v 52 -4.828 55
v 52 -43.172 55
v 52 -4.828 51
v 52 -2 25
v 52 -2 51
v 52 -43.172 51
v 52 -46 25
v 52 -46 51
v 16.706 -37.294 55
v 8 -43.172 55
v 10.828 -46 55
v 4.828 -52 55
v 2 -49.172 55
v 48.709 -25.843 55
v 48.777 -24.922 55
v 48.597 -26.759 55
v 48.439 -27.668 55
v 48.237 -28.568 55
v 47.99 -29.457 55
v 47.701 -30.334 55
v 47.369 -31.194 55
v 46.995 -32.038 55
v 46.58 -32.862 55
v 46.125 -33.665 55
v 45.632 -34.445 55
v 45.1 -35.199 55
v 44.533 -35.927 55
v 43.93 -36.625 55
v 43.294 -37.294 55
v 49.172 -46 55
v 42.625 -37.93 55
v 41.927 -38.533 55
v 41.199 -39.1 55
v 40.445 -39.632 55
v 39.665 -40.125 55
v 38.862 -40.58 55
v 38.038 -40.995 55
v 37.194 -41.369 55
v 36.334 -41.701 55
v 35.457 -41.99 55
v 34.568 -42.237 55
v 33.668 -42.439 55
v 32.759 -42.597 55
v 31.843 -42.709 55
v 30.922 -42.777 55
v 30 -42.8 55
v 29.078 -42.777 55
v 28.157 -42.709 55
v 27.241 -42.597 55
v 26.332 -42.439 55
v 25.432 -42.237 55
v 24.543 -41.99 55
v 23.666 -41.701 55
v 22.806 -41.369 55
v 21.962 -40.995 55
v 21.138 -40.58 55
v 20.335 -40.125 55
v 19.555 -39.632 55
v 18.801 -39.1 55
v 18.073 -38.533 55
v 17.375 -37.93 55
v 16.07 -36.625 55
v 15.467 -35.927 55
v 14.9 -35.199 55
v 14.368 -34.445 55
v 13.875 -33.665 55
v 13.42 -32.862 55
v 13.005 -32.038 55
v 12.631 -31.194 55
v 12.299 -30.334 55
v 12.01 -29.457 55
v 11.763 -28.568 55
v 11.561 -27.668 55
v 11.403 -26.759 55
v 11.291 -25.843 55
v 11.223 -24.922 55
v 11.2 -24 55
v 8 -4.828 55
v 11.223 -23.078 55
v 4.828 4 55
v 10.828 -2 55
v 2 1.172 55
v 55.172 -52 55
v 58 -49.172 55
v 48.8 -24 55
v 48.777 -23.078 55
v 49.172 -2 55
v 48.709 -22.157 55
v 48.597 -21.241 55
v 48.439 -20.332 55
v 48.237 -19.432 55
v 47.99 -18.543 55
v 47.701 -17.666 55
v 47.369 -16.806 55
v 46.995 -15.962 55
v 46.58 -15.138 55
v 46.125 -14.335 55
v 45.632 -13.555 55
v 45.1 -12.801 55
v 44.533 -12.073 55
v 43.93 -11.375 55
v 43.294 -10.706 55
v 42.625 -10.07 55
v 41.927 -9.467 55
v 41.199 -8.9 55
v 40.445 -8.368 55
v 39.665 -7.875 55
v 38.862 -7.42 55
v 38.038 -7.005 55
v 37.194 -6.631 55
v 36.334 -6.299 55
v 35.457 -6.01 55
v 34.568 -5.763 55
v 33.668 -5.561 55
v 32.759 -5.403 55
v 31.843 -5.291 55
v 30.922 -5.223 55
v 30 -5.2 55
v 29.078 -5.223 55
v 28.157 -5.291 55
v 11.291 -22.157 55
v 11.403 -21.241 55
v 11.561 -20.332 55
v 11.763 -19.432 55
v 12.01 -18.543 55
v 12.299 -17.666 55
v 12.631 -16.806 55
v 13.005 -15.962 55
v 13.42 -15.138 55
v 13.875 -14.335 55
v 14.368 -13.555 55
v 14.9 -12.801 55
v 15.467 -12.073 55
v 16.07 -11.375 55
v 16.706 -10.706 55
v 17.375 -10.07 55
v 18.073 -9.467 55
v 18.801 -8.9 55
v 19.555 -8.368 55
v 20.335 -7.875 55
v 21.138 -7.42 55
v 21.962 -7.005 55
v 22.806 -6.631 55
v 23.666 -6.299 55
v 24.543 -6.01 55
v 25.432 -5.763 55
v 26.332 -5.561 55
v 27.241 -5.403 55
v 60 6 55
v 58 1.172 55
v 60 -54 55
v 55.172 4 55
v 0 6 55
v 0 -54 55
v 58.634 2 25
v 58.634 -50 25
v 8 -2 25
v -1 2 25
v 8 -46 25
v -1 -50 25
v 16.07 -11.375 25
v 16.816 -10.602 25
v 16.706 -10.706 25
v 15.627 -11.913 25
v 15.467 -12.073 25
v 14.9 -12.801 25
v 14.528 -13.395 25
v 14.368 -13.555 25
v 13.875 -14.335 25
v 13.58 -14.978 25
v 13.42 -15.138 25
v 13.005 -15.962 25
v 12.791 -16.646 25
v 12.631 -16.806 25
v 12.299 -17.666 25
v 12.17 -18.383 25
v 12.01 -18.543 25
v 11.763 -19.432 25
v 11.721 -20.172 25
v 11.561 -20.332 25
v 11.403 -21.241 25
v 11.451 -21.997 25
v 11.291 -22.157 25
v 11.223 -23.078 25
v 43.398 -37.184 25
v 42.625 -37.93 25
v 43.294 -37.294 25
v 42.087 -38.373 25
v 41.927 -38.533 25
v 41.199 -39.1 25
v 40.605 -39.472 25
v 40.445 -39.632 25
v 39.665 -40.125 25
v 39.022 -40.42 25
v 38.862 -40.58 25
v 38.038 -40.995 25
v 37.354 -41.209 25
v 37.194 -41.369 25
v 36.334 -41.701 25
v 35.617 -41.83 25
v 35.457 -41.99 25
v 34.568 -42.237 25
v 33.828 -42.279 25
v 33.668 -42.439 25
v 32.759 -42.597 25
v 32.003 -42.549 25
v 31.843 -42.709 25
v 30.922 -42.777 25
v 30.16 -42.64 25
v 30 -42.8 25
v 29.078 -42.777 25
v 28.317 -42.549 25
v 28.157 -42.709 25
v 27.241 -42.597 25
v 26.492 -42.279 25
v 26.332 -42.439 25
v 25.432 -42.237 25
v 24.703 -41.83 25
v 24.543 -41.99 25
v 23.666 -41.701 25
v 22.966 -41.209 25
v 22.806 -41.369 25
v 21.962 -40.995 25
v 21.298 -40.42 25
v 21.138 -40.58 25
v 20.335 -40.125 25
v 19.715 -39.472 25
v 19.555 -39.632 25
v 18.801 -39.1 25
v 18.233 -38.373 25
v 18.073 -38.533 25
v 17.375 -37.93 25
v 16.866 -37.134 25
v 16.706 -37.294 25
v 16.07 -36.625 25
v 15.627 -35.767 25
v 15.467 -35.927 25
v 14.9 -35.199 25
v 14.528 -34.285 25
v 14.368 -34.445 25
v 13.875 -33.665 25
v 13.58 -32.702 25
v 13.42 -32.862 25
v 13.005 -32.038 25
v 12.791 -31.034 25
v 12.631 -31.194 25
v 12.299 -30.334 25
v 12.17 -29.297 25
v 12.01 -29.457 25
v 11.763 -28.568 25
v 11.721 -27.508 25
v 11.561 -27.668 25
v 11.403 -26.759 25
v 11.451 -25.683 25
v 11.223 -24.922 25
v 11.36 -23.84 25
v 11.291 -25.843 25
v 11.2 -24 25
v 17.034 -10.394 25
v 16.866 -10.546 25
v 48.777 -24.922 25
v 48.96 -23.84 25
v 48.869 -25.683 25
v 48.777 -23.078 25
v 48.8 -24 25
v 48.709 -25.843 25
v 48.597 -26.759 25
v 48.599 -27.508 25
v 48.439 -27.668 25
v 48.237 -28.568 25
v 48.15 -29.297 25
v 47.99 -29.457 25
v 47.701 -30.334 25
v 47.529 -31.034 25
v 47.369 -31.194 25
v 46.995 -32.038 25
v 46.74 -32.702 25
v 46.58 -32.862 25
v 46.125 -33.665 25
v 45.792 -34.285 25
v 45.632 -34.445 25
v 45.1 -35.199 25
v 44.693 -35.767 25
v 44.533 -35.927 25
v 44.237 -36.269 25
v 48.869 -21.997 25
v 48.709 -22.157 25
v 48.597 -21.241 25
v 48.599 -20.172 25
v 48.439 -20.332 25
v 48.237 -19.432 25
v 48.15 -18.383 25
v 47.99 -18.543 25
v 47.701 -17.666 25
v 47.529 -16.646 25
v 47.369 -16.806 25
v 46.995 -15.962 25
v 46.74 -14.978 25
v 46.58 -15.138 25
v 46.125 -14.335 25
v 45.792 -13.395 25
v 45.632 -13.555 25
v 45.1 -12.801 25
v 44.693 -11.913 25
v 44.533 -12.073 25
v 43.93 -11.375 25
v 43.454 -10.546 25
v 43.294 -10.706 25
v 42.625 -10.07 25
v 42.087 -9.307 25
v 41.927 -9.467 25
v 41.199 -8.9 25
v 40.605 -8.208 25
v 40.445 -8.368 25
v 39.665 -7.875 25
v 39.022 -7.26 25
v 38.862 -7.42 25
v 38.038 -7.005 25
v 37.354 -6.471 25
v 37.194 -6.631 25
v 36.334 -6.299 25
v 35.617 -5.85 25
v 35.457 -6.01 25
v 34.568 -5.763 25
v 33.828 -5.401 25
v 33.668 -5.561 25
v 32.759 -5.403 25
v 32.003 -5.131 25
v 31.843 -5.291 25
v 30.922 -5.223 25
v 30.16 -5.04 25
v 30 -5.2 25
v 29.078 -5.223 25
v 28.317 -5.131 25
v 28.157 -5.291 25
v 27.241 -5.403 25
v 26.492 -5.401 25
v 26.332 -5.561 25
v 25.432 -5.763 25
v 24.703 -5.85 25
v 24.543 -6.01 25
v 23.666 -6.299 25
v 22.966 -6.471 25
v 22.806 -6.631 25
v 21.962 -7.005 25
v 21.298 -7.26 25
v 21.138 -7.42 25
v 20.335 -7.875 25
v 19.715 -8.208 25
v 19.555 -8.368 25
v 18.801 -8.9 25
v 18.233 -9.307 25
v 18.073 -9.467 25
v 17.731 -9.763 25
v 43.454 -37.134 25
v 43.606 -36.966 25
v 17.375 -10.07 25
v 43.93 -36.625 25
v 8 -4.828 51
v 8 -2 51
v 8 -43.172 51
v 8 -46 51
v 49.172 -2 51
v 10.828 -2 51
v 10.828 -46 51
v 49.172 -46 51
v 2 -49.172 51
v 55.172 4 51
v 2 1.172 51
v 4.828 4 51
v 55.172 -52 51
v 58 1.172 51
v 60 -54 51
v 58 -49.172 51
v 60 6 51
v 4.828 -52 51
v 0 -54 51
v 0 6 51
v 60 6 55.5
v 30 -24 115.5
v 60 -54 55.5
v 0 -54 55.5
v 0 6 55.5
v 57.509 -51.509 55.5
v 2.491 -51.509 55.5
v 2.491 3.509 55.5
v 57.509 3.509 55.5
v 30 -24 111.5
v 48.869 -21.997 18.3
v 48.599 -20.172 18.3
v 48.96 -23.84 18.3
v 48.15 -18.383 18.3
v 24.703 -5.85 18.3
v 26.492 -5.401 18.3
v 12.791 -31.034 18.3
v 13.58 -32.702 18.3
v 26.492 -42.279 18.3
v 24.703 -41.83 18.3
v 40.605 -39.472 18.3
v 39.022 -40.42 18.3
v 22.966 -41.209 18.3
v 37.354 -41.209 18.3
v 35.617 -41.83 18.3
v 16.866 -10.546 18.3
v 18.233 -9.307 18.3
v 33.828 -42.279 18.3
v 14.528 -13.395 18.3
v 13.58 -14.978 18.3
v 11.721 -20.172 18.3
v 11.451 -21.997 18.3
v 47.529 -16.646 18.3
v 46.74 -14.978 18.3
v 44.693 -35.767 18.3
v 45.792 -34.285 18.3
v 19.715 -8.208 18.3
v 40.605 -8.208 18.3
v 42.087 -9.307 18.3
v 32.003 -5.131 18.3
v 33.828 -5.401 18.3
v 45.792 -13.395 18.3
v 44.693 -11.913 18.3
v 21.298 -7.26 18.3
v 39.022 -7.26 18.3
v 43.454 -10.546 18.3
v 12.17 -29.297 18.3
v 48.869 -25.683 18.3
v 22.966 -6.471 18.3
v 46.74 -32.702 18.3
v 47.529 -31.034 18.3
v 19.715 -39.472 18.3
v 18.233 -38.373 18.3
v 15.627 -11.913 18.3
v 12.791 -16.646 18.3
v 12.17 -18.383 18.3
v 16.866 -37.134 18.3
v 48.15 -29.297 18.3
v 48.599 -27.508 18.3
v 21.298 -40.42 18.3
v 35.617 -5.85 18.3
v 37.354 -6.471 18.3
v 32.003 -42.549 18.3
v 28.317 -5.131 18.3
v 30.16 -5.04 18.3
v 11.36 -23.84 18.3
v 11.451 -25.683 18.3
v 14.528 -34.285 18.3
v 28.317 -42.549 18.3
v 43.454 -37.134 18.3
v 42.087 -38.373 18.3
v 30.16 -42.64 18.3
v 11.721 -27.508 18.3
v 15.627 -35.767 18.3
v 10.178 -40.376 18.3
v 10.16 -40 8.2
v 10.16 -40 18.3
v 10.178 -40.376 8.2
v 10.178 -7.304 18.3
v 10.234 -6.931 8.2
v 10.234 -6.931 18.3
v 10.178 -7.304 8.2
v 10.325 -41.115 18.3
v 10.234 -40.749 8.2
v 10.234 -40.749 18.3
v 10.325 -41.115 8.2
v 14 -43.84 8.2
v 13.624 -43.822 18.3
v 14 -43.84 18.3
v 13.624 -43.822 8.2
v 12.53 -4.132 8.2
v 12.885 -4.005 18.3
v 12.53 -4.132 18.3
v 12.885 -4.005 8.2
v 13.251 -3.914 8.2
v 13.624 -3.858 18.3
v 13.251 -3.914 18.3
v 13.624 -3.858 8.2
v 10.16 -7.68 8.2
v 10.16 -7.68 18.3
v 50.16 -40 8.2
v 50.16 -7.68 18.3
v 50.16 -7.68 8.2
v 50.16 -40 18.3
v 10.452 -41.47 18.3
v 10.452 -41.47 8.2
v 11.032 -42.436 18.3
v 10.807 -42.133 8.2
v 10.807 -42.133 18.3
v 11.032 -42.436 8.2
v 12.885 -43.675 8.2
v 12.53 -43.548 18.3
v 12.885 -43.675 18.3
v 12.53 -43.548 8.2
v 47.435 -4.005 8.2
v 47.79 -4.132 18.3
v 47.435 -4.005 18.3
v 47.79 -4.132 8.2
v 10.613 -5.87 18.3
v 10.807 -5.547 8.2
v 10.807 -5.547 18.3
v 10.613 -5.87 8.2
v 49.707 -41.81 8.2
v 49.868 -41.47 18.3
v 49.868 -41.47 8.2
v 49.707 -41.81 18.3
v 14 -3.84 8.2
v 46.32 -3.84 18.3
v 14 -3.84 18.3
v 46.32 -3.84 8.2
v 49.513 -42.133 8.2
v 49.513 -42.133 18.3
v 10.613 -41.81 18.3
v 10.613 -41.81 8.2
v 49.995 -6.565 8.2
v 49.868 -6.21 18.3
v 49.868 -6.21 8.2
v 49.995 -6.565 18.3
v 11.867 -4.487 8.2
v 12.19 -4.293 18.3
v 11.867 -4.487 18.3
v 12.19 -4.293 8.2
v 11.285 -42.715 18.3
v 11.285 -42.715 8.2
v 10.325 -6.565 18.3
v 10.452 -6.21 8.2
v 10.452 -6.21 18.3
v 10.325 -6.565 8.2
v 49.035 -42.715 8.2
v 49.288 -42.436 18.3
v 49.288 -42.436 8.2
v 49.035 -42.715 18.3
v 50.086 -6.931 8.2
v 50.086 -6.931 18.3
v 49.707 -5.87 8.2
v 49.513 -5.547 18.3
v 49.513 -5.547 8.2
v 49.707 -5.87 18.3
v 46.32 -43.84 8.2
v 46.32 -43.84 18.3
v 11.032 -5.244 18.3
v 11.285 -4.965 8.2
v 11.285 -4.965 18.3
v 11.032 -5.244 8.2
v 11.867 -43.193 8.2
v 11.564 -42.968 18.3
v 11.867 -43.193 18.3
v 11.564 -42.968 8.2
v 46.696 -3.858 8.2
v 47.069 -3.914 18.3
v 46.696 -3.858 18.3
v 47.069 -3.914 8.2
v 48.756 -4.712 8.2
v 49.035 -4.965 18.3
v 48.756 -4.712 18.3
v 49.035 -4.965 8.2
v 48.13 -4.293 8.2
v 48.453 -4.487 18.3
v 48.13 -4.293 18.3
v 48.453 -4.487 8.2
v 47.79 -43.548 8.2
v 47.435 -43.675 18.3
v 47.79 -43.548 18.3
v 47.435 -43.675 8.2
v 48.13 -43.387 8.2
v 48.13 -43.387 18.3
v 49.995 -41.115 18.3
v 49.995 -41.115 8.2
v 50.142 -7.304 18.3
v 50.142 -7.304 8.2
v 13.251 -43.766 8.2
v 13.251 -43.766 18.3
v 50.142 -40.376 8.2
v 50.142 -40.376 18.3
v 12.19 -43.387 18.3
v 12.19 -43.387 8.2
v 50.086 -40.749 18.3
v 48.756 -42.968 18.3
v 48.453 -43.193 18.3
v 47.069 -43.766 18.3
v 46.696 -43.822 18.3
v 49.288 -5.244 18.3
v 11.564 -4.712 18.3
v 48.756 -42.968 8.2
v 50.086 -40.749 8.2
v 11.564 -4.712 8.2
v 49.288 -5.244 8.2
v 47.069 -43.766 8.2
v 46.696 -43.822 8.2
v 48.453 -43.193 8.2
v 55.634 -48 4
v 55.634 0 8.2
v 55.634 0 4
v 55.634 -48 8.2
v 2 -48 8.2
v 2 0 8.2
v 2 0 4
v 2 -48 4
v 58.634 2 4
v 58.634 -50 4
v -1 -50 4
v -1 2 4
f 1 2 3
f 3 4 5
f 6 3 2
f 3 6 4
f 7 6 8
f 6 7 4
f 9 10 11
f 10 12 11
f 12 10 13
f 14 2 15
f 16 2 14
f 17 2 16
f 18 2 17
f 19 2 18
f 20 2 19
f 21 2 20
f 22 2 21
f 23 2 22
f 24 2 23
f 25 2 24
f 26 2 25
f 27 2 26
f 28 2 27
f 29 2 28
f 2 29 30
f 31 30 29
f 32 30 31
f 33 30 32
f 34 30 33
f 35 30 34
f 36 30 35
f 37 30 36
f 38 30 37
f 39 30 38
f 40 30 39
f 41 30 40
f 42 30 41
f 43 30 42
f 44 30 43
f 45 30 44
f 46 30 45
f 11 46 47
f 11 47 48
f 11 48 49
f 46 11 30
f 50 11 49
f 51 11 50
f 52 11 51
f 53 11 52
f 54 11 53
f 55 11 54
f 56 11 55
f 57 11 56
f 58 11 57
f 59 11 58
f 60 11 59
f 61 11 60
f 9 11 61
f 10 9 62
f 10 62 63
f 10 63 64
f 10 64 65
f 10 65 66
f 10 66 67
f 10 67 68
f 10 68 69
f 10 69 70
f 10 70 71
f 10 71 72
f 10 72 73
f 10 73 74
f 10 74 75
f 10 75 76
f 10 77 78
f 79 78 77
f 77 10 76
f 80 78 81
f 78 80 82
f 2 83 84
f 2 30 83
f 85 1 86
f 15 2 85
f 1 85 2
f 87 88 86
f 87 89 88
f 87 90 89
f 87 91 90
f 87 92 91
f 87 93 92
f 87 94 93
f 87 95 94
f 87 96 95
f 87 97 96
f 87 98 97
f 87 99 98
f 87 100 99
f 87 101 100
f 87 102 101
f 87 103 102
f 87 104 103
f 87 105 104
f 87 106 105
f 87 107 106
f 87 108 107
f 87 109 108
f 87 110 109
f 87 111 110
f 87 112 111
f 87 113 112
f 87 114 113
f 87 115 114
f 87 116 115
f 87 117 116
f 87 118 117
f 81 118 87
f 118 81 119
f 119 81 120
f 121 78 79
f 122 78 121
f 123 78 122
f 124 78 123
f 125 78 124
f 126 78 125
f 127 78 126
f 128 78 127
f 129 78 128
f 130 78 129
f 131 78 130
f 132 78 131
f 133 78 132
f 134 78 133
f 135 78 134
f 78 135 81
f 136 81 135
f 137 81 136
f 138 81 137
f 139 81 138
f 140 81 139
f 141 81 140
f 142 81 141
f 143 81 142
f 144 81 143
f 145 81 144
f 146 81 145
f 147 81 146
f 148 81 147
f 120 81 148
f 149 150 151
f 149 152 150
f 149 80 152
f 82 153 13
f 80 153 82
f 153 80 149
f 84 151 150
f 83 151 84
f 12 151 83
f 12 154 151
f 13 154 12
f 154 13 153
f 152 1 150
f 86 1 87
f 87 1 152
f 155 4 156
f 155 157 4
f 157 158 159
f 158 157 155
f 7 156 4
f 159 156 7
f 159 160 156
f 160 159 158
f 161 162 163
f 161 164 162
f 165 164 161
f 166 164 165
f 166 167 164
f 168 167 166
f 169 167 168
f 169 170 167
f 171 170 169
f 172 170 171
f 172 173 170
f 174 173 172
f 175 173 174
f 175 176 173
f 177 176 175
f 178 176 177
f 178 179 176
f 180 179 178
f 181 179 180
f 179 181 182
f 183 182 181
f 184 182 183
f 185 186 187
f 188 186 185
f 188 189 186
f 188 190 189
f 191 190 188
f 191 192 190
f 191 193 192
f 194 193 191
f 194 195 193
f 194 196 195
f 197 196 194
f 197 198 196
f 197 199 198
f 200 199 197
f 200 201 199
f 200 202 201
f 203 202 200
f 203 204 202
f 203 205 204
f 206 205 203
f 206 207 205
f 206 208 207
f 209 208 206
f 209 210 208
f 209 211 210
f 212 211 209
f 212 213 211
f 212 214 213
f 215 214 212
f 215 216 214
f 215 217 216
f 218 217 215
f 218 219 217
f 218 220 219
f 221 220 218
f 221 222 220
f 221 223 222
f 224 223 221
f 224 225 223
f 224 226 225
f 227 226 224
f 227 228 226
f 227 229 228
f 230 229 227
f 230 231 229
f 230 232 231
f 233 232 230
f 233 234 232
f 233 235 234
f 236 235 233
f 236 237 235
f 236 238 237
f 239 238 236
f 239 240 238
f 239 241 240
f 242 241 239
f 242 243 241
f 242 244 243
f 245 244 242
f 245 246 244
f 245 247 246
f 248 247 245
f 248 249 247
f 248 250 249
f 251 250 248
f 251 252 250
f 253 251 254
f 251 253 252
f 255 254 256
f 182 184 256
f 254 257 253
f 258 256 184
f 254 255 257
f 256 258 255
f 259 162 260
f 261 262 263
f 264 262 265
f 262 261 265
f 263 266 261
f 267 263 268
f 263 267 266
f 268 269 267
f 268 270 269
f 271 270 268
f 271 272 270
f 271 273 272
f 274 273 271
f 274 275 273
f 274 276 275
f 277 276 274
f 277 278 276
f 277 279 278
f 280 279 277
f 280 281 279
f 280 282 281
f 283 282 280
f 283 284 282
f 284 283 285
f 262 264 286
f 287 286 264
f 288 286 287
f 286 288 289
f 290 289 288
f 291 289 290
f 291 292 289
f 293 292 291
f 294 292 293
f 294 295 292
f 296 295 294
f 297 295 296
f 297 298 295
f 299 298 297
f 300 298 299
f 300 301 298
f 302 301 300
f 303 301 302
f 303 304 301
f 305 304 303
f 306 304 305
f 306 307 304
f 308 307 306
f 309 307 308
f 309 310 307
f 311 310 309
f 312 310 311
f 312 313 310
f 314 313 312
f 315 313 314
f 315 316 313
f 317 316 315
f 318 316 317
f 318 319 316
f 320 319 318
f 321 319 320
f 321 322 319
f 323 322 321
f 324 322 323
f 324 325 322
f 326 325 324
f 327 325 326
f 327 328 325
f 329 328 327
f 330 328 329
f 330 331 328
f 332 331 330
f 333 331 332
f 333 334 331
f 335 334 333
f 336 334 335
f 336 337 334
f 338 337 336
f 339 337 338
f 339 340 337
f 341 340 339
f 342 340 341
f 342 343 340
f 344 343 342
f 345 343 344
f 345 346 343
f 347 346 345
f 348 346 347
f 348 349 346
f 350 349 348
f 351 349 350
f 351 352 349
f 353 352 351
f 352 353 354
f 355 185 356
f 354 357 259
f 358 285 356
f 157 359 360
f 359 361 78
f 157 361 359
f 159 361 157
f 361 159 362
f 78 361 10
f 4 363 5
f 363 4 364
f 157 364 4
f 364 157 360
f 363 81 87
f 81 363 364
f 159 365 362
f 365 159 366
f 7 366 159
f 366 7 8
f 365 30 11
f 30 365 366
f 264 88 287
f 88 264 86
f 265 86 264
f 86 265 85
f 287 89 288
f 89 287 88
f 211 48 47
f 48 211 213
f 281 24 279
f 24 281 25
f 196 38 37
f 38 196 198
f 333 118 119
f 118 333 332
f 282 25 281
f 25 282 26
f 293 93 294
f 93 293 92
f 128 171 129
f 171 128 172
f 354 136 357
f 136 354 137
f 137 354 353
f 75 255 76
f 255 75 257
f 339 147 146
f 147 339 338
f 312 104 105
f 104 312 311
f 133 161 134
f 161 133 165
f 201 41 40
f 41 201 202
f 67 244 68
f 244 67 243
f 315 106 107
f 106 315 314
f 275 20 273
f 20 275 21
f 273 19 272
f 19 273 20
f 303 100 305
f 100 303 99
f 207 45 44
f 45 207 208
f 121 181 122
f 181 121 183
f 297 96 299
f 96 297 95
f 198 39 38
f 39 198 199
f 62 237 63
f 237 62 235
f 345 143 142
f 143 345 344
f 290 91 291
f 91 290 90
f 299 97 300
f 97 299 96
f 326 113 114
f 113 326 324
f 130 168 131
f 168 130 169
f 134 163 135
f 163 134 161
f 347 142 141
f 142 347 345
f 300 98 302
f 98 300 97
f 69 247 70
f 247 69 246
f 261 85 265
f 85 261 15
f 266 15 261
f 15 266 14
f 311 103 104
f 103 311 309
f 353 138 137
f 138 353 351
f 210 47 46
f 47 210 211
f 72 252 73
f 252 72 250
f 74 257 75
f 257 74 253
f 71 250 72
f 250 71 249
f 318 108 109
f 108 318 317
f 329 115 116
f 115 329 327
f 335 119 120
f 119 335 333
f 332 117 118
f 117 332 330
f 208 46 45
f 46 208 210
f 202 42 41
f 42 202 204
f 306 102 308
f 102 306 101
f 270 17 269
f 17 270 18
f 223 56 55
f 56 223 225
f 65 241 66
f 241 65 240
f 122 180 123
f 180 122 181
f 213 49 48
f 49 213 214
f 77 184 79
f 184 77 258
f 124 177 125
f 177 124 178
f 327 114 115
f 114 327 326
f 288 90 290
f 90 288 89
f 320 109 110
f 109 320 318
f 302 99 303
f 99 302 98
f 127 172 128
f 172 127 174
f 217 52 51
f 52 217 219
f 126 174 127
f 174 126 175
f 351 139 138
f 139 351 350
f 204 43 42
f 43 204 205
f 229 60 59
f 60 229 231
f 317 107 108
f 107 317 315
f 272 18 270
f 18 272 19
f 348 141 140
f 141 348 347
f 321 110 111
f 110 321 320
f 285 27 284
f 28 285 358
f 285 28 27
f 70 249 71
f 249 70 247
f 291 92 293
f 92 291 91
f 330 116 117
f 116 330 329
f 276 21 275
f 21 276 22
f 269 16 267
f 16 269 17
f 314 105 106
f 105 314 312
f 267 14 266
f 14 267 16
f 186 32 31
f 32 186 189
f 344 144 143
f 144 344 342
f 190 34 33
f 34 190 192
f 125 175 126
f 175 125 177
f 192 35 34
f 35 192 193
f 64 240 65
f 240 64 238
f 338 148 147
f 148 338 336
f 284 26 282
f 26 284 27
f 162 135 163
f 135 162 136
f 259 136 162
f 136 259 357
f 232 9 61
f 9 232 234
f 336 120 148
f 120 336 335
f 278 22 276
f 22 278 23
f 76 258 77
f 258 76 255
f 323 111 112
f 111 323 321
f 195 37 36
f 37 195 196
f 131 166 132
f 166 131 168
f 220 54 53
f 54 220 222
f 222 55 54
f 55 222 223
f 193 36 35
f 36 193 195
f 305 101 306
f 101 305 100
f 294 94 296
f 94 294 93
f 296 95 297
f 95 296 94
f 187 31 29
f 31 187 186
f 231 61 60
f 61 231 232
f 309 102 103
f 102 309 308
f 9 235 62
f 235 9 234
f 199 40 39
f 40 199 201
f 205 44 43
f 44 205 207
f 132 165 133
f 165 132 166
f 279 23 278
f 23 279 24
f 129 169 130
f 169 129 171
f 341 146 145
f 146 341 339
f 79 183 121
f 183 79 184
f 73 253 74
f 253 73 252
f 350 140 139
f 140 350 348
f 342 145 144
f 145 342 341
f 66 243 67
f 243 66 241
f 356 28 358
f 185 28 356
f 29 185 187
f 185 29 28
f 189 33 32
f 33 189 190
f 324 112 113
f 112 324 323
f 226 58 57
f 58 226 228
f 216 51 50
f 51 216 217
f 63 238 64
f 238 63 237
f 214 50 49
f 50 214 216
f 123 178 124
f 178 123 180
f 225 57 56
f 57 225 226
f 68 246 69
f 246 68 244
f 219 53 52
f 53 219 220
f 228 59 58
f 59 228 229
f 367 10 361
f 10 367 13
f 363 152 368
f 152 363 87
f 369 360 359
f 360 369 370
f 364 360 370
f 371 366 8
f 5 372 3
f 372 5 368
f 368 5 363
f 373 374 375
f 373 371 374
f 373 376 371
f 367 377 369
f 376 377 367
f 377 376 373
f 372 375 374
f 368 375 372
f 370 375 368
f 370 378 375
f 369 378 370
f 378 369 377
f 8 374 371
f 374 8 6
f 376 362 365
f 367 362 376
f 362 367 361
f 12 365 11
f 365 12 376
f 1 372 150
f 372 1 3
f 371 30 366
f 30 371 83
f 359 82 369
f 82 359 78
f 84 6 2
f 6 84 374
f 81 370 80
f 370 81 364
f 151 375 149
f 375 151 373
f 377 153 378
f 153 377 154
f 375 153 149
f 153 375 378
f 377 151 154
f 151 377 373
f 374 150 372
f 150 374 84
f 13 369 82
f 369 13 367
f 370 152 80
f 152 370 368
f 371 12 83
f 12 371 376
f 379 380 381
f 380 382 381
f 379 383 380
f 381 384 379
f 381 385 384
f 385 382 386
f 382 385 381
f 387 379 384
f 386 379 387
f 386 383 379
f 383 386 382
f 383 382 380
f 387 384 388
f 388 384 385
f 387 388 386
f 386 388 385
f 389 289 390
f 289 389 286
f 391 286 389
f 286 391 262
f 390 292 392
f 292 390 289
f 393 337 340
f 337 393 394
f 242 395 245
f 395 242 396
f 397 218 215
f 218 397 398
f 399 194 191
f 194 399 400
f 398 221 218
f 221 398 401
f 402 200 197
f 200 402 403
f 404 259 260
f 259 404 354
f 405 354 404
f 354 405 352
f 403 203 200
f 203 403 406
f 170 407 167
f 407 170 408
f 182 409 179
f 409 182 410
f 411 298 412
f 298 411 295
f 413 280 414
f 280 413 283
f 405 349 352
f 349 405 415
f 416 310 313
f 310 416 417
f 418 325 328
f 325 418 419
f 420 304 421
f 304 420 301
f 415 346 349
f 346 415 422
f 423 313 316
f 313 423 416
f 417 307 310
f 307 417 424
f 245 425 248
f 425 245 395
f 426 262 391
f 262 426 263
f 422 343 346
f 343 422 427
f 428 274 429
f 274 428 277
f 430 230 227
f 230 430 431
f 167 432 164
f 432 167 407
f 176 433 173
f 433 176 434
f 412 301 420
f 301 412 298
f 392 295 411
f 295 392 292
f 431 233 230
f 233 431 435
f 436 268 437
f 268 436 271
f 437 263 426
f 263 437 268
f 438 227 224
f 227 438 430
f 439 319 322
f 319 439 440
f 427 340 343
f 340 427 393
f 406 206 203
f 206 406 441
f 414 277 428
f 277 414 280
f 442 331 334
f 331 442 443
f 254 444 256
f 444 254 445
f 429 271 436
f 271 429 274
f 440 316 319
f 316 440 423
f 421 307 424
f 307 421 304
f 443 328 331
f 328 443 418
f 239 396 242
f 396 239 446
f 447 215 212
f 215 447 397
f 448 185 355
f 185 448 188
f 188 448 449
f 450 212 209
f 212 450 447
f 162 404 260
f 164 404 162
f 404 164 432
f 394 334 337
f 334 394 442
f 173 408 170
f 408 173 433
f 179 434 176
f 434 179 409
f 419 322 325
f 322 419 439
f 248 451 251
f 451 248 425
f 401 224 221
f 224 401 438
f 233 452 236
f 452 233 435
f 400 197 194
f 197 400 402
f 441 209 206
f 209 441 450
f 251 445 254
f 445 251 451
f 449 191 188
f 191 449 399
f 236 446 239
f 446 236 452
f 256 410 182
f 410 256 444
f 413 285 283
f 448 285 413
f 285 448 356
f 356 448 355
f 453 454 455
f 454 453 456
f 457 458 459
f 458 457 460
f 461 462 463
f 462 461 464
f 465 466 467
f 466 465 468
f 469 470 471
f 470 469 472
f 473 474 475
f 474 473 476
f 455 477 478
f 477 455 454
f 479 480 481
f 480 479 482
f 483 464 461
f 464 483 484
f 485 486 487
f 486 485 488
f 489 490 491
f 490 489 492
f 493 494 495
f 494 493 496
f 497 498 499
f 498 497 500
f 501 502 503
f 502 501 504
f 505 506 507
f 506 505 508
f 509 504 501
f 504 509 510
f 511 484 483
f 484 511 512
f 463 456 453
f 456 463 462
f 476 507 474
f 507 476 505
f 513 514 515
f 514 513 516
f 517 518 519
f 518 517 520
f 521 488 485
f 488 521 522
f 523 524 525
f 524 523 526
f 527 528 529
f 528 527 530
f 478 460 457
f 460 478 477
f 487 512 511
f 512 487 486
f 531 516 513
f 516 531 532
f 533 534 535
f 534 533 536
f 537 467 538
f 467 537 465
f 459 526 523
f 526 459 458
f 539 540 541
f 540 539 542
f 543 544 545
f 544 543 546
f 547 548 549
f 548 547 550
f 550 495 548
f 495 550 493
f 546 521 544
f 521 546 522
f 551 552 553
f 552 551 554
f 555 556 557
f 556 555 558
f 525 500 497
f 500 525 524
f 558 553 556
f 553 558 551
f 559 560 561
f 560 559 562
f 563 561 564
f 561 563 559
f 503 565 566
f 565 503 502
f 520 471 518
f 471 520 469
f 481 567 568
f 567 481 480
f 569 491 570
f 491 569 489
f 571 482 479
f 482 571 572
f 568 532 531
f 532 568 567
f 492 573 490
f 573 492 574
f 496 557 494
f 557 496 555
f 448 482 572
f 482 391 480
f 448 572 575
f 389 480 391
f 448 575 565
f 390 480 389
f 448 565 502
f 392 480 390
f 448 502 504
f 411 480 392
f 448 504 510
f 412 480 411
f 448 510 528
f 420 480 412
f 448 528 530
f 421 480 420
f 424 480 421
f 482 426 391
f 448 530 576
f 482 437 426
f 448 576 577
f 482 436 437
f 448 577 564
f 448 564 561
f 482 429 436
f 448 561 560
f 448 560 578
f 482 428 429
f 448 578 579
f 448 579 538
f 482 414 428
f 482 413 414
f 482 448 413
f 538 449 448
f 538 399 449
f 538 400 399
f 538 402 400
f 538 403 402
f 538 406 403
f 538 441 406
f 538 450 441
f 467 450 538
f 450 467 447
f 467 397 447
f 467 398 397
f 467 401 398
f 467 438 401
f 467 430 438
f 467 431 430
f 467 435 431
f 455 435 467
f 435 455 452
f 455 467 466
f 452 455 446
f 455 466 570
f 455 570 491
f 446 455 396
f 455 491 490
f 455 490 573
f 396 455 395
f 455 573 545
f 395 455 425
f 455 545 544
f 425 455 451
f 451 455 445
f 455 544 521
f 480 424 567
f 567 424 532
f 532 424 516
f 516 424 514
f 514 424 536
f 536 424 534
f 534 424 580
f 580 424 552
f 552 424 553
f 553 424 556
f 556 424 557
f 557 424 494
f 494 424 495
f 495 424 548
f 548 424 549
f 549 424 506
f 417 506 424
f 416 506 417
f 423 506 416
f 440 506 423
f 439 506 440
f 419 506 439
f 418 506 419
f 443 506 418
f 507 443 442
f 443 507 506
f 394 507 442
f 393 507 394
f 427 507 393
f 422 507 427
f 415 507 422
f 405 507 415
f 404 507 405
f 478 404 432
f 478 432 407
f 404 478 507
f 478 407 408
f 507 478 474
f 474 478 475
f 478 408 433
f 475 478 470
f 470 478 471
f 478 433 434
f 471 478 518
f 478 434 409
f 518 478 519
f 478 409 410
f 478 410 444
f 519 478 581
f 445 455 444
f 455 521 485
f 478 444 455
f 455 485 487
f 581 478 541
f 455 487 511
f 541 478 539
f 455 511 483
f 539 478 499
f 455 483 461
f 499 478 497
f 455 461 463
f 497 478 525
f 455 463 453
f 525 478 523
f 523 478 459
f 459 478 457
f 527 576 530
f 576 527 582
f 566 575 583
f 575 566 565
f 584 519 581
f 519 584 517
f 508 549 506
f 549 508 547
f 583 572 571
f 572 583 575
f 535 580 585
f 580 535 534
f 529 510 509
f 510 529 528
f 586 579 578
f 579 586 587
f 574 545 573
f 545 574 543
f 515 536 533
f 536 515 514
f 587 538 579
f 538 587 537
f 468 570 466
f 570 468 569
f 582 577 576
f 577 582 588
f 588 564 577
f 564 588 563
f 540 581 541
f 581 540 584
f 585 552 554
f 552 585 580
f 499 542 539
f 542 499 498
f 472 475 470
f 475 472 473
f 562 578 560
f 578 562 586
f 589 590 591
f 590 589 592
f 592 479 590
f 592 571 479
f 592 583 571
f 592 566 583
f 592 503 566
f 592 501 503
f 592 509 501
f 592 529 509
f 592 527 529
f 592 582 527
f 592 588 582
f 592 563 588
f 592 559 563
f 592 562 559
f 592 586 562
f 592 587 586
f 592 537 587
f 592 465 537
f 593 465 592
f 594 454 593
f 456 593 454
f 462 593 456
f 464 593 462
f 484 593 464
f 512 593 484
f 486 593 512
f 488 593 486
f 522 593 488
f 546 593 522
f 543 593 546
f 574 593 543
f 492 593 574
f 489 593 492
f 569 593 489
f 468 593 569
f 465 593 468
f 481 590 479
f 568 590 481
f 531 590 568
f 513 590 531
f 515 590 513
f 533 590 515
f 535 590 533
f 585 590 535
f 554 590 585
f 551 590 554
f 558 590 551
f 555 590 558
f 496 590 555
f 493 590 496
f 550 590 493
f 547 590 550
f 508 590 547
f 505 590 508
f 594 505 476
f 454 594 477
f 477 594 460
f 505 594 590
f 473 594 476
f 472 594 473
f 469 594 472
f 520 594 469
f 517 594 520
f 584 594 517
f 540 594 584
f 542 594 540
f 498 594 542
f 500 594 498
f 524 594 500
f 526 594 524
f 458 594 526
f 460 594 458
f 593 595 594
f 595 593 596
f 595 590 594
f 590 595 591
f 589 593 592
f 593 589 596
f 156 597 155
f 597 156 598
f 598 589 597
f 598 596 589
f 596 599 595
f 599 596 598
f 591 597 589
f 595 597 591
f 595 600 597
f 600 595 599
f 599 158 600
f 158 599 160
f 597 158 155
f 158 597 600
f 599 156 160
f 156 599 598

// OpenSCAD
// file: LilWeatherPi_Fan_Polyhedron_cap_chimney_final.scad
// Dr.Gerg's Battery Box
// OpenSCAD definition file
// https://www.drgerg.com
// OpenSCAD Cheatsheet http://www.openscad.org/cheatsheet/index.html
//
// PARAMETER DEFINITIONS// PARAMETER DEFINITIONS
// 
// 60x60x60

use <LilWeatherPi_Fan_Polyhedron_cap.scad>

topPoints = [
    [28,28,-1],      //0
    [28,-28,-1],     //1
    [-28,-28,-1],    //2
    [-28,28,-1],     //3
    [0,0,56]];       //4  TDC

lowPoints = [
    [26,26,-1],      //0
    [26,-26,-1],     //1
    [-26,-26,-1],    //2
    [-26,26,-1],     //3
    [0,0,54]];       //4  TDC

topFaces = [
    [0,1,4],
    [1,2,4],
    [2,3,4],
    [3,0,4],
    [2,1,0],[0,3,2]];


module pyramid(){
    difference(){
    polyhedron(topPoints,topFaces);
    polyhedron(lowPoints,topFaces);
    }
}
module screw(){
    translate([16,16,-23])
    cylinder(h=20,r=1.5,center=true);
}
module screws(){
    screw();
    rotate(90)
    screw();
    rotate(180)
    screw();
    rotate(270)
    screw();
}


$fn=128;

// chimney
module chimney(){
    translate([0,0,-15.5])
    difference(){
        difference(){
            difference(){
                cube([44,44,30], center=true);
                cylinder(d=37.6,h=64,center=true);
            }
        }
    }
    // Screen holder
    difference(){
        translate([0,0,-2.5])
        union(){
        rotate([0,0,45])
        cube([80,4,4], center=true);
        rotate([0,0,135])
        cube([80,4,4], center=true);
        }
        cylinder(d=37.6,h=64,center=true);
    }

    translate([0,0,-2.5])
    difference(){
        cube([60,60,4], center=true);
        translate([0,0,.5])
        cube([56,56,6], center=true);
    }
screws();
}


chimney();
// #cap();
// file: LilWeatherPi_Fan_Polyhedron_cap.scad
// Dr.Gerg's Battery Box
// OpenSCAD definition file
// https://www.drgerg.com
// OpenSCAD Cheatsheet http://www.openscad.org/cheatsheet/index.html
//
// PARAMETER DEFINITIONS// PARAMETER DEFINITIONS
// 
// 60x60x60


topPoints = [
    [30,30,0],      //0
    [30,-30,0],     //1
    [-30,-30,0],    //2
    [-30,30,0],     //3
    [0,0,60]];       //4  TDC

lowPoints = [
    [28,28,-1],      //0
    [28,-28,-1],     //1
    [-28,-28,-1],    //2
    [-28,28,-1],     //3
    [0,0,56]];       //4  TDC

topFaces = [
    [0,1,4],
    [1,2,4],
    [2,3,4],
    [3,0,4],
    [2,1,0],[0,3,2]];


module cap(){
    difference(){
    polyhedron(topPoints,topFaces);
    polyhedron(lowPoints,topFaces);
    }
}

cap();
// file: LilWeatherPi_Fan.scad
// Dr.Gerg's Lil WeatherPi Vent Fan
// OpenSCAD definition file
// https://www.drgerg.com
// OpenSCAD Cheatsheet http://www.openscad.org/cheatsheet/index.html
//
// PARAMETER DEFINITIONS// PARAMETER DEFINITIONS
// 
wall = 1;  // how thick do you want the wall to be?
cornerDia = 7.68; // The diameter of the screw holes for the two pole contacts.
totLength = 40; // Total length of assembly.
totWidth = 40;  // Total width of assembly.
baseHt = 10.3; // Thickness of the fan only.
throat = 37.6; // diameter of fan.
screwR = 1.5; // radius of screw hole.

//
//// MAIN BODY OF BUILD
// COMPONENT BODY DEFINITION
//
module fanscrews(){
    translate([0,0,-19])
    cylinder(h=baseHt+20,r=screwR);
    translate([totLength-cornerDia,0,-19])
    cylinder(h=baseHt+20,r=screwR);
    translate([0,totWidth-cornerDia,-19])
    cylinder(h=baseHt+20,r=screwR);
    translate([totLength-cornerDia,totWidth-cornerDia,-19])
    cylinder(h=baseHt+20,r=screwR);
}
$fn=64;
module fanThroat(){
    translate([totLength/2-(cornerDia/2),totWidth/2-(cornerDia/2),-1])
    cylinder(h=baseHt+10,d=throat);
}


module fanFrame(){
        minkowski(){
        cube([totLength-cornerDia,totWidth-cornerDia,baseHt/2]);
        cylinder(baseHt/2,d=cornerDia);
        }
}


module fanbody(){
    union(){
        difference(){
                difference(){
                minkowski(){
                    cube([totLength-cornerDia,totWidth-cornerDia,baseHt/2]);
                    cylinder(baseHt/2,d=cornerDia);
                    }
                fanThroat();
                }
            fanscrews();
        }
    }
}
fanbody();
// main file
// Dr.Gerg's Battery Box
// OpenSCAD definition file
// https://www.drgerg.com
// OpenSCAD Cheatsheet http://www.openscad.org/cheatsheet/index.html
//
// PARAMETER DEFINITIONS// PARAMETER DEFINITIONS
// 
use <LilWeatherPi_Fan.scad>
use <LilWeatherPi_Fan_Polyhedron_cap.scad>
use <LilWeatherPi_Fan_Polyhedron_cap_chimney_final.scad>
wall = 2;  // how thick do you want the wall to be?
cornerDia = 11.2684; // The diameter of the filet on the back of the box.
totLength = 52; // Total length (y) of assembly.
totWidth = 54;  // Total width (x) of assembly.
filletAdd = 5.6342; // Added to cover curved edge on back of box.
baseHt = 4; // Thickness of the base only.
fanx =14;
fany = -40;
fanz = 0;

//

// module screw(){
//     translate([16,16,-23])
//     cylinder(h=20,r=1.5,center=true);
// }
// module screws(){
//     screw();
//     rotate(90)
//     screw();
//     rotate(180)
//     screw();
//     rotate(270)
//     screw();
// }

$fn=128;
module main(){
    difference(){
        translate([wall,-totLength+2*wall,0])
        cube([(totWidth-2*wall)+(cornerDia/2-wall),totLength-2*wall,baseHt*2]);
        union(){
            translate([0,-totLength+wall,-wall*2])
            cube([totWidth-2*wall,totLength,baseHt*2]);
            translate([cornerDia/2,+wall,0])
            intersection(){
                translate([0,-totLength,-wall])
                cube([totWidth-2*wall,totLength+2*wall,baseHt*2]);
                translate([totWidth-2*wall-cornerDia/2,+wall/2,-cornerDia/2+baseHt])
                rotate([90,0,0])
                cylinder(totLength,d=cornerDia,center=false);
            }
        }
    }
}
module baseAssy(){
    difference(){
        main();
        translate([fanx,fany,4])
        union(){
            // screws();
            fanThroat();
        }
    }
}

module hollow(){
            translate([wall,-totLength+2*wall,0])
            cube([(totWidth-2*wall)+(cornerDia/2-wall),totLength-2*wall,8.2]);
            translate([fanx,fany,4])
            union(){
            fanThroat();
            translate([0,0,10])
            screws();
            translate([0,0,20])
            fanThroat();
            translate([0,0,4])
            fanFrame();
        }
}

module fanshroud(){
    difference(){
        translate([-1,-(totLength-2),4])
        cube([totWidth+filletAdd,totLength,21]);
        union(){
        hollow();
        translate([30,-24,55.5])
        screws();
        }
    translate([fanx,fany,8])
    fanbody();
    }
}


module fanbase(){
    difference(){
    baseAssy();
    translate([fanx,fany,8])
    translate([0,0,10])
    fanscrews();
    }
}


translate([30,-24,55.5])
union(){
#chimney();
#cap();
}

fanshroud();

// fanbase();
